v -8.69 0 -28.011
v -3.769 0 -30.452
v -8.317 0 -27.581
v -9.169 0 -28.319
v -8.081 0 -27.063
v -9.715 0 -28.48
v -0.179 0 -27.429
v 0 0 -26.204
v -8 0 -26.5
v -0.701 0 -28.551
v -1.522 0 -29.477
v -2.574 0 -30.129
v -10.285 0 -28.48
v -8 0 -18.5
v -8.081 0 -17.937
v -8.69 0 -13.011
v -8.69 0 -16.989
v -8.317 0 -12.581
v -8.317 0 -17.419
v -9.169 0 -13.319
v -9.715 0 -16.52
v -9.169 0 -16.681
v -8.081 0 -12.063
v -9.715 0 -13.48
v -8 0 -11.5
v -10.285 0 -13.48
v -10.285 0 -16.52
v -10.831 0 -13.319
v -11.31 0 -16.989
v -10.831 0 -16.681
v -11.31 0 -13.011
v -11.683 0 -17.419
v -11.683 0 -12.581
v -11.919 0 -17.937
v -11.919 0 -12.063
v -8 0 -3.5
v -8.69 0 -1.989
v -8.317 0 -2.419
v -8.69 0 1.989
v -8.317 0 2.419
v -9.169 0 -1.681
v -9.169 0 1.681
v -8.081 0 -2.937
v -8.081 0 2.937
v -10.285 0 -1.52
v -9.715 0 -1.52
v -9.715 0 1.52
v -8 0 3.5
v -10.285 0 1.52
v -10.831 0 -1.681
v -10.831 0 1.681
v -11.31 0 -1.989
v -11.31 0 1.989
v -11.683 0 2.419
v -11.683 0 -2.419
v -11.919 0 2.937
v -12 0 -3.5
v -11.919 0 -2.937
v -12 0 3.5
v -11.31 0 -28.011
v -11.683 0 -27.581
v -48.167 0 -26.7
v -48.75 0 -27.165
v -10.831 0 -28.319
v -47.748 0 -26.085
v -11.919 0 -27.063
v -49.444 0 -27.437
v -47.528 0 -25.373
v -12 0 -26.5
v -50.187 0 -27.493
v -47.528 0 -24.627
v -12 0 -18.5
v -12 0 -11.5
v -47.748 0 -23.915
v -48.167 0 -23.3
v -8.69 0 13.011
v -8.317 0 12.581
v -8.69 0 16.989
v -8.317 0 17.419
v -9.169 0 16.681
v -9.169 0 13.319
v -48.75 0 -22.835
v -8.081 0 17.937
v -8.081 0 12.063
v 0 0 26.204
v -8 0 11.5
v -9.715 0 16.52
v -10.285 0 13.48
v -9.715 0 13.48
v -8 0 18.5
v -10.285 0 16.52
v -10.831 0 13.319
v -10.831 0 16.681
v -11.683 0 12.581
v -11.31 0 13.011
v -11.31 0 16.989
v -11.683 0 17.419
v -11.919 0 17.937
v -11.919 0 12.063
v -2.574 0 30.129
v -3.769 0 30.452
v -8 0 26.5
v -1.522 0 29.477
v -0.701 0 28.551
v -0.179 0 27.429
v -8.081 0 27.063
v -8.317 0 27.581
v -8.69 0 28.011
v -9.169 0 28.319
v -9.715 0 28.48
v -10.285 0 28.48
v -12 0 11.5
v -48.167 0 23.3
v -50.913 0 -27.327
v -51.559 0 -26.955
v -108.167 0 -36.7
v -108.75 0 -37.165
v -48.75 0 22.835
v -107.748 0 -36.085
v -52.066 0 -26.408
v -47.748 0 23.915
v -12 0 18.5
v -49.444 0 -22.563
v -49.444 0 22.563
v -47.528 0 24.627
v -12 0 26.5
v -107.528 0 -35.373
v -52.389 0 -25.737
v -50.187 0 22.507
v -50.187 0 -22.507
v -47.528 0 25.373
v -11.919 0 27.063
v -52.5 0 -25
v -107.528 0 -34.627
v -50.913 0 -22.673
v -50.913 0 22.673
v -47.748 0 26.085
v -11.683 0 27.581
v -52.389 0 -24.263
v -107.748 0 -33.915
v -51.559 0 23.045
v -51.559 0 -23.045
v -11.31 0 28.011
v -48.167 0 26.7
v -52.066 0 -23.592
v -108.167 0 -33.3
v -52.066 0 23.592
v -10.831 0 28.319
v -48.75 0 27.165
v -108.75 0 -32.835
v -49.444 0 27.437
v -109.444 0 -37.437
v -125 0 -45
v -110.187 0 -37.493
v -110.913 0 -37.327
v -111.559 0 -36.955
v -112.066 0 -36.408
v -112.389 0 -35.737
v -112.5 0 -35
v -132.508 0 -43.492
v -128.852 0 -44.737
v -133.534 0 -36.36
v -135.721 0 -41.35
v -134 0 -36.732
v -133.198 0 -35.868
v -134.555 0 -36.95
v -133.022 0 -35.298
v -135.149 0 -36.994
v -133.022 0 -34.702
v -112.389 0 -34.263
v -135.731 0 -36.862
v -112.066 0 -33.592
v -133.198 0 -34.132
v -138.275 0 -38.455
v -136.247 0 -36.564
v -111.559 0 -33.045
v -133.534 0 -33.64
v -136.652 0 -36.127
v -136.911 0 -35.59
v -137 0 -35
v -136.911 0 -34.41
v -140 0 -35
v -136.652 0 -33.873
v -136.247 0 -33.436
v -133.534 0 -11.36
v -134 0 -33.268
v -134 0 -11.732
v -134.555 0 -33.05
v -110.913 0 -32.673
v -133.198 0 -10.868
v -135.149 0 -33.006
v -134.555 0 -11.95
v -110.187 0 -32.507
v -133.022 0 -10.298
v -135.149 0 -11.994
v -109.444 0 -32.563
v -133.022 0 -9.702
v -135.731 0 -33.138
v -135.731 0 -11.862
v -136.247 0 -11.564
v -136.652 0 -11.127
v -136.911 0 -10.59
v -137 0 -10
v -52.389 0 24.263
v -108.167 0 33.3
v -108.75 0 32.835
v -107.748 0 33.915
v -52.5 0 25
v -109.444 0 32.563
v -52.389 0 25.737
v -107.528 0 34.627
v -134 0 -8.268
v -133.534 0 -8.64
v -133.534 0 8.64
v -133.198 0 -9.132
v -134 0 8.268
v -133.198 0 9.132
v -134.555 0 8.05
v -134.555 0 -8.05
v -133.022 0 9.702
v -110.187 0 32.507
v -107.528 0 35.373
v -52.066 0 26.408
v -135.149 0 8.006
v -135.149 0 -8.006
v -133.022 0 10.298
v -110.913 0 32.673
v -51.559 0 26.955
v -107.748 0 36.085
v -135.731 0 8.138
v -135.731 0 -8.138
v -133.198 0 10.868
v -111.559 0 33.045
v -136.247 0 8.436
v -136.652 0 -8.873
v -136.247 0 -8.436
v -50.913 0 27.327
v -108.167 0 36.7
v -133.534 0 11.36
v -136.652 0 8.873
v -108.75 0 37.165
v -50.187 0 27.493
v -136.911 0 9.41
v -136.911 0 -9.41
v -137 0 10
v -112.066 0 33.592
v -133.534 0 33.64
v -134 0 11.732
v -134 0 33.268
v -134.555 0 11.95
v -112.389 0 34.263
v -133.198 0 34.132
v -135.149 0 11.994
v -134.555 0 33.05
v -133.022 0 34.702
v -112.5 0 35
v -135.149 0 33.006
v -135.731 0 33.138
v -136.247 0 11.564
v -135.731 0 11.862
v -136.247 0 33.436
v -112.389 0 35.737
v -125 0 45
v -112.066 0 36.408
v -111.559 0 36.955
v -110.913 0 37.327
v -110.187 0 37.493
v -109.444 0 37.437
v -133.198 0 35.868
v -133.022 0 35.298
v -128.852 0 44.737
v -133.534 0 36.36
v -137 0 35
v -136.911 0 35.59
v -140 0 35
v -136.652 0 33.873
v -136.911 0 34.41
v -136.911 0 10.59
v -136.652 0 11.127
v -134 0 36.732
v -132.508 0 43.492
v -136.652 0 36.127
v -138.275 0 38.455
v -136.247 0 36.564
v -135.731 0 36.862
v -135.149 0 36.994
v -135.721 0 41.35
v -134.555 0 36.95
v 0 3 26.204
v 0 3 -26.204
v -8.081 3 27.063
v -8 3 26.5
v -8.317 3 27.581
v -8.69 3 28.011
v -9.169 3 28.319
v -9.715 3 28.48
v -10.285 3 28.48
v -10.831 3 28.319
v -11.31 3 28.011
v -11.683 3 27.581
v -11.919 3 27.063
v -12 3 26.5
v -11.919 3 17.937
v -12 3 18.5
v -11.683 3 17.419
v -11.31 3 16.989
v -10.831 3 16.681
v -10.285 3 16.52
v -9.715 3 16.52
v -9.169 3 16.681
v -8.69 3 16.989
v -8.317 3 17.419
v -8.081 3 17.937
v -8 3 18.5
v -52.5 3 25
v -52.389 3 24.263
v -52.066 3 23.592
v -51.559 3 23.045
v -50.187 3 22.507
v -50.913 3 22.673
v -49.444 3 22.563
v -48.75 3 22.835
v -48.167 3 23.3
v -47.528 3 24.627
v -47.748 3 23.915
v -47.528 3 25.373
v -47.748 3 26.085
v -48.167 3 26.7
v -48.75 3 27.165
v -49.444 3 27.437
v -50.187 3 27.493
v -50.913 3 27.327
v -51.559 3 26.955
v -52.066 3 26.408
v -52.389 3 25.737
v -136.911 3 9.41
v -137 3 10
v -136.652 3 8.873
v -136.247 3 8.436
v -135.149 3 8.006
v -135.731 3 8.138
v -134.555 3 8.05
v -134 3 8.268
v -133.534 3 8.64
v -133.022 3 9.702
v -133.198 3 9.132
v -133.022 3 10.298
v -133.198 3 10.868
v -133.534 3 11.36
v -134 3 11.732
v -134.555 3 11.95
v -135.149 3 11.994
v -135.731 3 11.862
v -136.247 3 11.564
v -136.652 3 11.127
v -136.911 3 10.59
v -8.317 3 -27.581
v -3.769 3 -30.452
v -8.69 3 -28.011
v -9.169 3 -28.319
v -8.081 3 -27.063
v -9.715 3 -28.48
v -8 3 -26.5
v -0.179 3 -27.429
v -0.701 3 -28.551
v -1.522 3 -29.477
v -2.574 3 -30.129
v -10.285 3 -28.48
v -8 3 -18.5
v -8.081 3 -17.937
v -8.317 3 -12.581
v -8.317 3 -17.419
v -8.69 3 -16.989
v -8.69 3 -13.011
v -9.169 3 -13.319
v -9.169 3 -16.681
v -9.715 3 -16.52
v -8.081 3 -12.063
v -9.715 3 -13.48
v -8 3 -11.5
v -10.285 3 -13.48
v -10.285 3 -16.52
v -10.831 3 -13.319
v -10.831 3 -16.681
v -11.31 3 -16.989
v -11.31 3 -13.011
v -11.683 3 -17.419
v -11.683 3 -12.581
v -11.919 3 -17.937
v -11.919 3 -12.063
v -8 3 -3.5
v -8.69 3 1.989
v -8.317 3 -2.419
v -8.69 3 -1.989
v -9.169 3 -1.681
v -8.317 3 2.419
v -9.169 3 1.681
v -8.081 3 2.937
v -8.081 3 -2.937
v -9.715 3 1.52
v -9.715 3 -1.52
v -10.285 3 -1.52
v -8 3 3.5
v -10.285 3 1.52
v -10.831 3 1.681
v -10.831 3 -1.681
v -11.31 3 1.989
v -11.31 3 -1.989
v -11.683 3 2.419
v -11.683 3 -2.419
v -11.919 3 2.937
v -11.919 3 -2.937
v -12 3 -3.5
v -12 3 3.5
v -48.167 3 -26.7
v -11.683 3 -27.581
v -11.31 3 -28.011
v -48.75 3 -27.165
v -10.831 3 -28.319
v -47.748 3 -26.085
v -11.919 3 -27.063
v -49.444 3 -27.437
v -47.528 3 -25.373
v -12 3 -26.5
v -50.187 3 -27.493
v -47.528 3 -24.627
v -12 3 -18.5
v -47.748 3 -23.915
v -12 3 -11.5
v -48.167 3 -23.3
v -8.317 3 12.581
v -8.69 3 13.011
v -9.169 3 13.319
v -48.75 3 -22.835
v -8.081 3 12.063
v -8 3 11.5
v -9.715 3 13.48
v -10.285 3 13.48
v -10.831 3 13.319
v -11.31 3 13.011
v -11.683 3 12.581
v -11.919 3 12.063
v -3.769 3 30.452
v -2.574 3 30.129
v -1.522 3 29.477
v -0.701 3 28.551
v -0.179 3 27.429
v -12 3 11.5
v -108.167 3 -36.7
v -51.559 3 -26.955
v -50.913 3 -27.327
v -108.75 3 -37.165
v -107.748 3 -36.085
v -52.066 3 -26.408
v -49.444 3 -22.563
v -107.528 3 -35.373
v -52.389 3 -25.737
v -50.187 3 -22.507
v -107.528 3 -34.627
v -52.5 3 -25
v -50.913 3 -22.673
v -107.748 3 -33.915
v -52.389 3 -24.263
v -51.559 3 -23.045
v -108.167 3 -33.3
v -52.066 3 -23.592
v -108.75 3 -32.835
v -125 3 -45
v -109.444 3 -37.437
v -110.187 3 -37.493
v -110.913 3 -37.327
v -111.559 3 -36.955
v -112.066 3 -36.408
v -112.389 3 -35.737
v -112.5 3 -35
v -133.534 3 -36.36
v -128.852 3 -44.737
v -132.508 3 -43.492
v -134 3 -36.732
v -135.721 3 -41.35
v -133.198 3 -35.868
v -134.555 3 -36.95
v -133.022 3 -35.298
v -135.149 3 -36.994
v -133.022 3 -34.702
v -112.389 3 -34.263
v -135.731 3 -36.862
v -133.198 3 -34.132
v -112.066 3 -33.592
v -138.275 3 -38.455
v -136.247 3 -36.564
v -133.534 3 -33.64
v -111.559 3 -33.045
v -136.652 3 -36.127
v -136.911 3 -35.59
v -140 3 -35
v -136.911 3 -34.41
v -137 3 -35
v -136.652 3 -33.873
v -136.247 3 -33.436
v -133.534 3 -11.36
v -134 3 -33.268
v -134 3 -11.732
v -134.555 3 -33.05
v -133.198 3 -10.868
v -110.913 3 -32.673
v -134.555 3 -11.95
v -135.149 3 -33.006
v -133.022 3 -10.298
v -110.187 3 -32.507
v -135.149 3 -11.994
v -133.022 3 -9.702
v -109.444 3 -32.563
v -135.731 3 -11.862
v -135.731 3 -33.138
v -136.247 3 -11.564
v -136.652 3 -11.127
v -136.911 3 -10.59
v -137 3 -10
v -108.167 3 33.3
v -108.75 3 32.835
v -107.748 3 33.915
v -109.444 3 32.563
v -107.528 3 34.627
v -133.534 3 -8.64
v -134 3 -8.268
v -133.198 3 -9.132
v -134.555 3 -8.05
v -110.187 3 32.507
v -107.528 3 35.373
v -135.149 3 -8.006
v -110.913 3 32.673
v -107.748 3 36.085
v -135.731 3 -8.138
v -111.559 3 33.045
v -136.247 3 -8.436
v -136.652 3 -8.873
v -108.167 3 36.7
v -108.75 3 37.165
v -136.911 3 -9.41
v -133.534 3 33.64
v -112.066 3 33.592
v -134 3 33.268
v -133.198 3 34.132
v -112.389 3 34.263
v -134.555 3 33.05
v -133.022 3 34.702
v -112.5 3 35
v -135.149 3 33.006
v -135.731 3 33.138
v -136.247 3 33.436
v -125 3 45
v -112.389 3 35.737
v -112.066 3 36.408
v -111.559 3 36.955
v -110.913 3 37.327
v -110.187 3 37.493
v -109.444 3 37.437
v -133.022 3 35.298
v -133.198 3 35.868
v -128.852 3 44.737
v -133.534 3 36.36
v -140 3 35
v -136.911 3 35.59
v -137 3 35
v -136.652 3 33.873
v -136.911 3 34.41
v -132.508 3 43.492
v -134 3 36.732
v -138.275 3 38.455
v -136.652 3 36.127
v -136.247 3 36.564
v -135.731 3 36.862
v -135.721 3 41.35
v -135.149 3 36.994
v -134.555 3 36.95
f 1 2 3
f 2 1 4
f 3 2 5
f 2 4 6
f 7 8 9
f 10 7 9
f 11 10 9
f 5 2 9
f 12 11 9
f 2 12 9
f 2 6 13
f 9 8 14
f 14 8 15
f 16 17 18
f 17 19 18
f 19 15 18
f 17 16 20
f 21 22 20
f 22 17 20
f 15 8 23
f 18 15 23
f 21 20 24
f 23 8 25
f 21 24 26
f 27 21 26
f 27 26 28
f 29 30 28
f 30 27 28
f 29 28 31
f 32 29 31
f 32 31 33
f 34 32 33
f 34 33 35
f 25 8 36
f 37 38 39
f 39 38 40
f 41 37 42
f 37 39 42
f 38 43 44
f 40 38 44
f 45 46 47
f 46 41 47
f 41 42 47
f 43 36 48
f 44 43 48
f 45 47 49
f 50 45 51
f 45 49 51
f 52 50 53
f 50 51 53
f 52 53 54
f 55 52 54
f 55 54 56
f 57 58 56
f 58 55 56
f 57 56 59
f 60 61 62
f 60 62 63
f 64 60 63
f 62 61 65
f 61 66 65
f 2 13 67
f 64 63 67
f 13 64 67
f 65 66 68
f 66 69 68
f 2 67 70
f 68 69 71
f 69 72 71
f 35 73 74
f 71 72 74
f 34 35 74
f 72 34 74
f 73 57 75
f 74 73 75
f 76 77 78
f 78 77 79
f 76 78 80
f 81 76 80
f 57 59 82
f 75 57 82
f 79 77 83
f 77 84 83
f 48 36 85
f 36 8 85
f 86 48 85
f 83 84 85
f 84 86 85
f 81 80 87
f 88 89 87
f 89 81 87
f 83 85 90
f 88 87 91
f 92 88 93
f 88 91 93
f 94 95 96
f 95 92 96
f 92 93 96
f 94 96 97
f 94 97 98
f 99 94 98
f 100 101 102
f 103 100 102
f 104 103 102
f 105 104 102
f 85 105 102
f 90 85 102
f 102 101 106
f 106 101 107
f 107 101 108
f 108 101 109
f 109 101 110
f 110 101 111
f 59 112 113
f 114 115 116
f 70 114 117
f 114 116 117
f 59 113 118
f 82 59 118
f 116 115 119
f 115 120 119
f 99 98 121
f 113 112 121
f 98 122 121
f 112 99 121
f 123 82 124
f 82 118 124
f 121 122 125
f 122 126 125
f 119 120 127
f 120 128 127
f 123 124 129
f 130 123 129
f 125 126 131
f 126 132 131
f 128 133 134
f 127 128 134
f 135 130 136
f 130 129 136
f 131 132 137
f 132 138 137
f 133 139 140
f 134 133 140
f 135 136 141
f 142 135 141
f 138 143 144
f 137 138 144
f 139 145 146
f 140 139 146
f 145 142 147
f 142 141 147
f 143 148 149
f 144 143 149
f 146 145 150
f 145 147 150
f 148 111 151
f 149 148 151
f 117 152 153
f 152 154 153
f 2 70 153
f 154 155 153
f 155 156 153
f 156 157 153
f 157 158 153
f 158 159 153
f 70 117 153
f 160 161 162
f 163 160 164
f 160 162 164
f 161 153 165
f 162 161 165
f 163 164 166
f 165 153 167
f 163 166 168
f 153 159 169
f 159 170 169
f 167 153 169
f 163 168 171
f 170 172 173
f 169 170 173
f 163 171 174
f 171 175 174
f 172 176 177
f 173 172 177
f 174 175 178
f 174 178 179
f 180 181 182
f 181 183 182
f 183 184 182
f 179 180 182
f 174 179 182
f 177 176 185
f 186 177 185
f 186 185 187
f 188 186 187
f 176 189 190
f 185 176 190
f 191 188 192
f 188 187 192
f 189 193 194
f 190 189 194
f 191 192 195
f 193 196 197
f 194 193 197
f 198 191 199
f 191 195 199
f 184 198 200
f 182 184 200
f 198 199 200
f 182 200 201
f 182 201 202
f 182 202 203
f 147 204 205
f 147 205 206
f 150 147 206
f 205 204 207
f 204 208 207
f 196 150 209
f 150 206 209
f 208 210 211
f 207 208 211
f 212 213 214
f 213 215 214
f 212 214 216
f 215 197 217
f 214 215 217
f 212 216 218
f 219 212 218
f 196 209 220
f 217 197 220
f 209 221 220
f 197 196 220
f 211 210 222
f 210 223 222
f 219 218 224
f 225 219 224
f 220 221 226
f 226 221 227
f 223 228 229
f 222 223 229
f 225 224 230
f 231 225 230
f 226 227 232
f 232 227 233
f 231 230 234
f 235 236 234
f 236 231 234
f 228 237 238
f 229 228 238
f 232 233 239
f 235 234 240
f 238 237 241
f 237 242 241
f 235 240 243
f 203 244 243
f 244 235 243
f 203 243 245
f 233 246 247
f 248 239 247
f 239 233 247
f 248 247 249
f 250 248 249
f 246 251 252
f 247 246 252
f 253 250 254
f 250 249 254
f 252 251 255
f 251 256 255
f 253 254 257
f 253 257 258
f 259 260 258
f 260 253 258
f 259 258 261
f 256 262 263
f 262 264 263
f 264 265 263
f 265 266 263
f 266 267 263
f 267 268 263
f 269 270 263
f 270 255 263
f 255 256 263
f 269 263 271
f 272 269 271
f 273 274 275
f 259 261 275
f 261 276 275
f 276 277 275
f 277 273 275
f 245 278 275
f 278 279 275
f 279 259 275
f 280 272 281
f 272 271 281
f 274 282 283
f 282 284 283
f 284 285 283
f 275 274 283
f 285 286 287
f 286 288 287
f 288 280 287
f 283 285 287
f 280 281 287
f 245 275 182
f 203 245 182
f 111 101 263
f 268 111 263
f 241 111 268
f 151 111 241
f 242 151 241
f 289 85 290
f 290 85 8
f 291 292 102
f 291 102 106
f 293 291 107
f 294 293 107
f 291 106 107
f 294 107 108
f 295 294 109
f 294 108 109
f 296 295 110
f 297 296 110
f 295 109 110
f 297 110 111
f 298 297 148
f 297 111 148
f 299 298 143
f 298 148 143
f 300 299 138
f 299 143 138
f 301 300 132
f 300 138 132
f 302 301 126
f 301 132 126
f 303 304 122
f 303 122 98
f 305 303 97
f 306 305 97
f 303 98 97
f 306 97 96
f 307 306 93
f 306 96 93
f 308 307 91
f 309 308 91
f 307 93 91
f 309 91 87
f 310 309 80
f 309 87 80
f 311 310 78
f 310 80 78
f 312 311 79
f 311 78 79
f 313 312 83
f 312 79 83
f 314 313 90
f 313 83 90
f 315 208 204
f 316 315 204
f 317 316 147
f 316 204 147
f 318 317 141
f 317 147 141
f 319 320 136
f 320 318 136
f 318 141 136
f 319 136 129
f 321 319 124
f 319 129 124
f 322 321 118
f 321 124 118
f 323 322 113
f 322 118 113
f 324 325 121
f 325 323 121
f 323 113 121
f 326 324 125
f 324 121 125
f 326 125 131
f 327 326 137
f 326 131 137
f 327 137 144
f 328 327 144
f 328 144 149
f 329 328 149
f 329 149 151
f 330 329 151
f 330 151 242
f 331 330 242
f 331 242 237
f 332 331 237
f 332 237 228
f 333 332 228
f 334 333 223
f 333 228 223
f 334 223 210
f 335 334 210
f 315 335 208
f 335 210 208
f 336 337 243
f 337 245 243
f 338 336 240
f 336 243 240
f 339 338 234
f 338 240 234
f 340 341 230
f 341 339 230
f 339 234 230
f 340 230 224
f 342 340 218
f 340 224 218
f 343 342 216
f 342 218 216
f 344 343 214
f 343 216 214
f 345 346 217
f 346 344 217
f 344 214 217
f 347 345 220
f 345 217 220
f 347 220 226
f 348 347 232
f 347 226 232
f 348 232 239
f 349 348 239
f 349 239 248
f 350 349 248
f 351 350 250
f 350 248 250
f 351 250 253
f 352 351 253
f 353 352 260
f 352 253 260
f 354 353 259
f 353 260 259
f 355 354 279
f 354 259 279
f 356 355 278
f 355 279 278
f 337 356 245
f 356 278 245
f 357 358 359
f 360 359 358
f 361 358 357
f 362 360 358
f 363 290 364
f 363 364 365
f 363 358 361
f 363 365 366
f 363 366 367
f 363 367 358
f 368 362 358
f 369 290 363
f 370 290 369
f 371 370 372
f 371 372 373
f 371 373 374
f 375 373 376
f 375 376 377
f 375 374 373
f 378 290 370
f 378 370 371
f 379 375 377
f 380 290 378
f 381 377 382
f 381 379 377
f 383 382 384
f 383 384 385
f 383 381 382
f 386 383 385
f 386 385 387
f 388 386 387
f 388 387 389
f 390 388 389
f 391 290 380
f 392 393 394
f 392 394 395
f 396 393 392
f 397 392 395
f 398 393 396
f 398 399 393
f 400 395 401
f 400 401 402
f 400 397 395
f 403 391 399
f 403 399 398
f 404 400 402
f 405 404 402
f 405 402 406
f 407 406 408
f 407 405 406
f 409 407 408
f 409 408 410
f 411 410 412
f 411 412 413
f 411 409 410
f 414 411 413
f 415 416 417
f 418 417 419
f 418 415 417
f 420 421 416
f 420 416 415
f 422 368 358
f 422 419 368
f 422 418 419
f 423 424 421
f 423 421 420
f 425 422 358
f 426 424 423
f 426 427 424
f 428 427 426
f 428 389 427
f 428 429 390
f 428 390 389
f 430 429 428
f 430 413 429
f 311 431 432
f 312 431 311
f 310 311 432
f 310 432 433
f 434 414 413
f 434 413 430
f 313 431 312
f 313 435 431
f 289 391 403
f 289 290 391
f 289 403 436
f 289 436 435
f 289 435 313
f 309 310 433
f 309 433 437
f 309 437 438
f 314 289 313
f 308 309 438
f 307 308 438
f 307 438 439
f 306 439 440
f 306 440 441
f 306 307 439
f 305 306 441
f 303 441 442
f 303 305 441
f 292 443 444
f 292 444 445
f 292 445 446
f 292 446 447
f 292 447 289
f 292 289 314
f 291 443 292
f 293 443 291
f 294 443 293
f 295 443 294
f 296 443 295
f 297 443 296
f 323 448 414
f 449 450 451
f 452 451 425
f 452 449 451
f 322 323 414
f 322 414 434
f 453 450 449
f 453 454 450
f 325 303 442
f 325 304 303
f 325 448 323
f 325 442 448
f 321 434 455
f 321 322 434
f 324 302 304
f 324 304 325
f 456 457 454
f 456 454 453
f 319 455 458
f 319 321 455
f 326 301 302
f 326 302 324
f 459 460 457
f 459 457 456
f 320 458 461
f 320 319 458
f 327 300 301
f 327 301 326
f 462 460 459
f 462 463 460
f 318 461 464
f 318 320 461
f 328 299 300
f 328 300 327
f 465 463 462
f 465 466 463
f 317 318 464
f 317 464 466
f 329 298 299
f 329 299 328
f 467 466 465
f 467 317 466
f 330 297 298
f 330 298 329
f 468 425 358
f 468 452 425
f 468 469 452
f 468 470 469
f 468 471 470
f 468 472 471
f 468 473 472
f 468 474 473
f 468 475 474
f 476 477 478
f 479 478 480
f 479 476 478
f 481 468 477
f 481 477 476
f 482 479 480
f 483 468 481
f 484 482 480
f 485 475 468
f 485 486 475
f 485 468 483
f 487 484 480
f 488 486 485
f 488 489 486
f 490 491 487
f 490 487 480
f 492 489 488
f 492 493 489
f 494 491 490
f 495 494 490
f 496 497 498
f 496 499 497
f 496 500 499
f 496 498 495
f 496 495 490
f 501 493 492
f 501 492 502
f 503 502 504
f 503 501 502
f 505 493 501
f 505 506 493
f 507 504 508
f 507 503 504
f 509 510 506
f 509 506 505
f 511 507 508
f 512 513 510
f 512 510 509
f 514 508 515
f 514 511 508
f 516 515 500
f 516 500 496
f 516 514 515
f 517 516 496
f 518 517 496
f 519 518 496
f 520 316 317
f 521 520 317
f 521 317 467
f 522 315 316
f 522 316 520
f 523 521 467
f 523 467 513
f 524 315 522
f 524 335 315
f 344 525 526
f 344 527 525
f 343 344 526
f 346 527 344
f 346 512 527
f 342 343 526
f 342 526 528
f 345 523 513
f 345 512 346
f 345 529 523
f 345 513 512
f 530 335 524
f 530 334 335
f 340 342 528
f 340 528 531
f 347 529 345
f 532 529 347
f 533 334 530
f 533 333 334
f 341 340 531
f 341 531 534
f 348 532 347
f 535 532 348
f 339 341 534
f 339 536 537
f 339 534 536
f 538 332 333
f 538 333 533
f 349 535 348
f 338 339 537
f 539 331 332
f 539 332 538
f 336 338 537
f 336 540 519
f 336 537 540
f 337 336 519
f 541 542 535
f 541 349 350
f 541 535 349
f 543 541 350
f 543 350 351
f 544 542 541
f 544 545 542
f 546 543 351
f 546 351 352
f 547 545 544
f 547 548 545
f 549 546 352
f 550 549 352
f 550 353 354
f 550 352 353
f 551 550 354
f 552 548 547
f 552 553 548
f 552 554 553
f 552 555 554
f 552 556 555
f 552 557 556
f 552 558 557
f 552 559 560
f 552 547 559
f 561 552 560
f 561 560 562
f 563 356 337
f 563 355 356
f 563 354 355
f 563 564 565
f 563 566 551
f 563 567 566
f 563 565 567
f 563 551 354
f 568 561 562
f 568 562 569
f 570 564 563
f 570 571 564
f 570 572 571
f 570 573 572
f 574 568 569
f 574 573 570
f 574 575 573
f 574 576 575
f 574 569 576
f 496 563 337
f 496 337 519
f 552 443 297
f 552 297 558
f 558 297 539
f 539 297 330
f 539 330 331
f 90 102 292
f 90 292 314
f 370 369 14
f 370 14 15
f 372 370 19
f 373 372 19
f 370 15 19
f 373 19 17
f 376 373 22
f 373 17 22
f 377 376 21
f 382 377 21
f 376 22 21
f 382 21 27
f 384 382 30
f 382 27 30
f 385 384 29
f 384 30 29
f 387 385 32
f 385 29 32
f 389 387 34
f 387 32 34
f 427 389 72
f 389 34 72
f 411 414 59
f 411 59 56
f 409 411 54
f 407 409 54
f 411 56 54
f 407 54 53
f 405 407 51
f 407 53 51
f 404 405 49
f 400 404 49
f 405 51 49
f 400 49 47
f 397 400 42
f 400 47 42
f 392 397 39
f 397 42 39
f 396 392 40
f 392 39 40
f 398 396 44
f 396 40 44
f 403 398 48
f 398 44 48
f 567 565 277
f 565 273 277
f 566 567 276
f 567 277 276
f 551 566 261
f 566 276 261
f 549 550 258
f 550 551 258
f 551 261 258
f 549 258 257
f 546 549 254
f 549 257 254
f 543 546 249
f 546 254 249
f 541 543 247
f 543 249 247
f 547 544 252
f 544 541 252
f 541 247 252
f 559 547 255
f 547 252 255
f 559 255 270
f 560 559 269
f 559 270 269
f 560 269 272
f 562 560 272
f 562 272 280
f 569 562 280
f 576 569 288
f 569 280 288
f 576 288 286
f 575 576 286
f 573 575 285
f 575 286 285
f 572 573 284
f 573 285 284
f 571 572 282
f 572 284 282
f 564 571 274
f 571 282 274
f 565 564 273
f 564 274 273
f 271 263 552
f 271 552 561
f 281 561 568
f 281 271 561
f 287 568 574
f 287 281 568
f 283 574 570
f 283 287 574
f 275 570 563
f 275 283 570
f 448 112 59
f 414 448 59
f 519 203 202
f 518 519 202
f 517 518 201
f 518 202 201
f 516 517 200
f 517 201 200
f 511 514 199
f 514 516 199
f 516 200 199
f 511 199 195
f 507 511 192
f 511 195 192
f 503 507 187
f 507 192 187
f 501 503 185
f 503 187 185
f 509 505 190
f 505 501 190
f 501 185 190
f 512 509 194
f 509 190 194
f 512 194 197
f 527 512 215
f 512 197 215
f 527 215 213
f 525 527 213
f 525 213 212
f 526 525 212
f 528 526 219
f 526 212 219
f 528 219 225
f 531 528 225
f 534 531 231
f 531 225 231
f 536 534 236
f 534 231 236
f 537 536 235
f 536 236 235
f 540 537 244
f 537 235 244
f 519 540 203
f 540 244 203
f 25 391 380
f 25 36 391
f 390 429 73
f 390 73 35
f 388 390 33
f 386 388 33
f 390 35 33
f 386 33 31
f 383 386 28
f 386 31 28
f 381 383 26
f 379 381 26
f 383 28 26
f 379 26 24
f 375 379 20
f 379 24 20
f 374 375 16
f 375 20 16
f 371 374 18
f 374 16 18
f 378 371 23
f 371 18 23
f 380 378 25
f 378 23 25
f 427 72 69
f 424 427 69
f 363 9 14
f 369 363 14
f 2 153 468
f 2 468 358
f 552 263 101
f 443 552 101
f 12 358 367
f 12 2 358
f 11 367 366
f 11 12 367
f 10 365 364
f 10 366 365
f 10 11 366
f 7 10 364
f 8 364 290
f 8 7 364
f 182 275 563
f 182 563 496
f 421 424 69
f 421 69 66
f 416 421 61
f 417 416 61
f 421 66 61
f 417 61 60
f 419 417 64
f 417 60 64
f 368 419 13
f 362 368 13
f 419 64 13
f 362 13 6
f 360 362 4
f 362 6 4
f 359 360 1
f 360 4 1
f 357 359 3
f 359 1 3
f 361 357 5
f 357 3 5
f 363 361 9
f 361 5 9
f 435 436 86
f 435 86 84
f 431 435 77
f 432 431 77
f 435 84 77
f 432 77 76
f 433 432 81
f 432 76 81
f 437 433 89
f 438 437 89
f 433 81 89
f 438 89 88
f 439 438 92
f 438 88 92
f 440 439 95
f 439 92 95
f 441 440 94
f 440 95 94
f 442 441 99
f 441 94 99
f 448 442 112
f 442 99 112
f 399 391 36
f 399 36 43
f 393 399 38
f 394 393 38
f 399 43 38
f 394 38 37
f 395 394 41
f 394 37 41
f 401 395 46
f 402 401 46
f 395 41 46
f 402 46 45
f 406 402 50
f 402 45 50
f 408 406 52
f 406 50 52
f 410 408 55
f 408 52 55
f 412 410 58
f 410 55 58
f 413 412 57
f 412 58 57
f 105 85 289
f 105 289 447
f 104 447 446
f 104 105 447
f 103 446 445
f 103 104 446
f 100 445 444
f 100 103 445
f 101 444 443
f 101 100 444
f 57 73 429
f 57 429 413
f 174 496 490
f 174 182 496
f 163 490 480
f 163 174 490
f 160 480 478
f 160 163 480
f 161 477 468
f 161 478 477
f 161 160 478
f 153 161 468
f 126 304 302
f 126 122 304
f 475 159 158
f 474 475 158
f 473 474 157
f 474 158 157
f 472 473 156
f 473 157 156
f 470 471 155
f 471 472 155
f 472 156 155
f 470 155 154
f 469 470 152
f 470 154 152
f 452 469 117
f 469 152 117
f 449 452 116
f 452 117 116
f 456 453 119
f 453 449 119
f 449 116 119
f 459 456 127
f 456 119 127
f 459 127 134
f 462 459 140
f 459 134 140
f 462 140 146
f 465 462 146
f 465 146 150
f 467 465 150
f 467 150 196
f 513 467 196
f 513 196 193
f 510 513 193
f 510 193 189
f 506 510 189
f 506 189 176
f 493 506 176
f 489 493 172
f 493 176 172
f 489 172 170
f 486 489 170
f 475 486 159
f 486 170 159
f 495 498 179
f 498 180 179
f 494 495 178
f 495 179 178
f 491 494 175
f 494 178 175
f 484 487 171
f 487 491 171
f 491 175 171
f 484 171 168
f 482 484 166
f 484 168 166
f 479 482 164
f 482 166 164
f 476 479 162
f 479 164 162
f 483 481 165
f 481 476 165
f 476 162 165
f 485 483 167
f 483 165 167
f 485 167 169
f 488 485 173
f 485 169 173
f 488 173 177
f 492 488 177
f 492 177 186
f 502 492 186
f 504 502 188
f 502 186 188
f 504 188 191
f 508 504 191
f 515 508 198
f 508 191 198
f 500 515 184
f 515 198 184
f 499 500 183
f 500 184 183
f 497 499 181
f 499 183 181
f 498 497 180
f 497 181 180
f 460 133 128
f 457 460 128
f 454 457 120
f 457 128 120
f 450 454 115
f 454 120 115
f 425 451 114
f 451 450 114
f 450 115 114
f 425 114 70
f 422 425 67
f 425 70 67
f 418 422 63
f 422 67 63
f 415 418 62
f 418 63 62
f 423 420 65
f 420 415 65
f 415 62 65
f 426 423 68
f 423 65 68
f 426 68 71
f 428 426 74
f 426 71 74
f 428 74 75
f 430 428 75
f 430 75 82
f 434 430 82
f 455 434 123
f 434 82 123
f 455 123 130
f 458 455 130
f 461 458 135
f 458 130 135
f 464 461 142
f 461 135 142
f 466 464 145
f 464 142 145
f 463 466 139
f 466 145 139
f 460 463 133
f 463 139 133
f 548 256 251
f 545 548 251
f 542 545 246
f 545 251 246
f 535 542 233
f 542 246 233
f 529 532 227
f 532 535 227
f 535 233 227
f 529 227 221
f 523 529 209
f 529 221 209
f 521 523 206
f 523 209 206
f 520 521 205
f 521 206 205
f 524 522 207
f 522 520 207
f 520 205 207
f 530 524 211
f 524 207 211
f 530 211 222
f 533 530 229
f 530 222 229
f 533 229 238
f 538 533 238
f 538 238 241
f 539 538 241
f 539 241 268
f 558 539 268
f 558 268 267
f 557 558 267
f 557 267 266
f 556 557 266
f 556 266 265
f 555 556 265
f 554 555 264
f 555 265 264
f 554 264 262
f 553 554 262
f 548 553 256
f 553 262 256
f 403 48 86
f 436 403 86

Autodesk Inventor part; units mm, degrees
ref_plane "YZ Plane" through (0, 0, 0) normal (1, 0, 0) x (0, 1, 0)
ref_plane "XZ Plane" through (0, 0, 0) normal (0, 1, 0) x (-1, 0, 0)
ref_plane "XY Plane" through (0, 0, 0) normal (0, 0, 1) x (1, 0, 0)
sketch "Boceto1" plane through (0, 0, 0) normal (0, 1, 0) x (-1, 0, 0)
  line L0 (125, 0) -> (125, 45)
  line L1 (140, 0) -> (140, 35)
  arc A0 (140, 35) -> (125, 45) centre (125.919, 30.1285) ccw
  line L2 (0, 0) -> (0, 26.2041)
  line L3 (10, 0) -> (10, 32.2222)
  line L4 (0, 0) -> (0, 7.5)
  line L5 (0, 7.5) -> (0, 22.5)
  arc A1 (8, 3.5) -> (12, 3.5) centre (10, 3.5) ccw
  line L6 (10, 7.5) -> (6.5727, 7.5)
  arc A2 (12, 11.5) -> (8, 11.5) centre (10, 11.5) ccw
  line L7 (10, 15) -> (5.5099, 15)
  line L8 (12, 11.5) -> (12, 3.5)
  line L9 (8, 3.5) -> (8, 11.5)
  arc A3 (12, 26.5) -> (8, 26.5) centre (10, 26.5) ccw
  arc A4 (8, 18.5) -> (12, 18.5) centre (10, 18.5) ccw
  line L10 (12, 18.5) -> (12, 26.5)
  line L11 (8, 26.5) -> (8, 18.5)
  circle A5 centre (135, 10) radius 2
  circle A6 centre (135, 35) radius 2
  circle A7 centre (110, 35) radius 2.5
  line L12 (125, 45) -> (3.7689, 30.4523)
  circle A8 centre (50, 25) radius 2.5
  arc A9 (3.7689, 30.4523) -> (0, 26.2041) centre (4.2786, 26.2041) ccw
  line L13 (0, 0) -> (10, 0)
  line L14 (125, 0) -> (125, -45)
  line L15 (140, 0) -> (140, -35)
  arc A10 (125, -45) -> (140, -35) centre (125.919, -30.1285) ccw
  line L16 (0, 0) -> (0, -26.2041)
  line L17 (10, 0) -> (10, -32.2222)
  line L18 (0, 0) -> (0, -7.5)
  line L19 (0, -7.5) -> (0, -22.5)
  arc A11 (12, -3.5) -> (8, -3.5) centre (10, -3.5) ccw
  line L20 (10, -7.5) -> (6.5727, -7.5)
  arc A12 (8, -11.5) -> (12, -11.5) centre (10, -11.5) ccw
  line L21 (10, -15) -> (5.5099, -15)
  line L22 (12, -11.5) -> (12, -3.5)
  line L23 (8, -3.5) -> (8, -11.5)
  arc A13 (12, -18.5) -> (8, -18.5) centre (10, -18.5) ccw
  line L24 (12, -18.5) -> (12, -26.5)
  line L25 (8, -26.5) -> (8, -18.5)
  arc A14 (8, -26.5) -> (12, -26.5) centre (10, -26.5) ccw
  circle A15 centre (135, -10) radius 2
  circle A16 centre (135, -35) radius 2
  circle A17 centre (110, -35) radius 2.5
  line L26 (125, -45) -> (3.7689, -30.4523)
  circle A18 centre (50, -25) radius 2.5
  arc A19 (0, -26.2041) -> (3.7689, -30.4523) centre (4.2786, -26.2041) ccw
  dimension "d15" = 45
  dimension "d18" = 15
  dimension "d19" = 35
  dimension "d24" = 140
  dimension "d27" = 10
  dimension "d28" = 7.5
  dimension "d29" = 15
  dimension "d32" = 4
  dimension "d33" = 4
  dimension "d34" = 5
  dimension "d35" = 5
  dimension "d36" = 35
  dimension "d37" = 10
  dimension "d38" = 4
  dimension "d39" = 4
  dimension "d40" = 35
  dimension "d41" = 30
  dimension "d42" = 5
  dimension "d43" = 25
  dimension "d44" = 50
  dimension "d45" = 96.843
  dimension "d51" = 5
extrude "Extrusión1" add sketch "Boceto1" along normal blind 3 contours L14 L26 L17 A14 L24 A13 A12 L22 A11 L3 A1 L8 A2 A4 L10 A3 L12 L0 | L0 A0 L1 L15 A10 L14 | L3 A3 L11 A4 A2 L9 A1 L13 L2 A9 L12 | L26 A19 L16 L13 L17 A11 L23 A12 A13 L25 A14
equation "\"d35\" = d34"
properties part number "SoporteMano"
